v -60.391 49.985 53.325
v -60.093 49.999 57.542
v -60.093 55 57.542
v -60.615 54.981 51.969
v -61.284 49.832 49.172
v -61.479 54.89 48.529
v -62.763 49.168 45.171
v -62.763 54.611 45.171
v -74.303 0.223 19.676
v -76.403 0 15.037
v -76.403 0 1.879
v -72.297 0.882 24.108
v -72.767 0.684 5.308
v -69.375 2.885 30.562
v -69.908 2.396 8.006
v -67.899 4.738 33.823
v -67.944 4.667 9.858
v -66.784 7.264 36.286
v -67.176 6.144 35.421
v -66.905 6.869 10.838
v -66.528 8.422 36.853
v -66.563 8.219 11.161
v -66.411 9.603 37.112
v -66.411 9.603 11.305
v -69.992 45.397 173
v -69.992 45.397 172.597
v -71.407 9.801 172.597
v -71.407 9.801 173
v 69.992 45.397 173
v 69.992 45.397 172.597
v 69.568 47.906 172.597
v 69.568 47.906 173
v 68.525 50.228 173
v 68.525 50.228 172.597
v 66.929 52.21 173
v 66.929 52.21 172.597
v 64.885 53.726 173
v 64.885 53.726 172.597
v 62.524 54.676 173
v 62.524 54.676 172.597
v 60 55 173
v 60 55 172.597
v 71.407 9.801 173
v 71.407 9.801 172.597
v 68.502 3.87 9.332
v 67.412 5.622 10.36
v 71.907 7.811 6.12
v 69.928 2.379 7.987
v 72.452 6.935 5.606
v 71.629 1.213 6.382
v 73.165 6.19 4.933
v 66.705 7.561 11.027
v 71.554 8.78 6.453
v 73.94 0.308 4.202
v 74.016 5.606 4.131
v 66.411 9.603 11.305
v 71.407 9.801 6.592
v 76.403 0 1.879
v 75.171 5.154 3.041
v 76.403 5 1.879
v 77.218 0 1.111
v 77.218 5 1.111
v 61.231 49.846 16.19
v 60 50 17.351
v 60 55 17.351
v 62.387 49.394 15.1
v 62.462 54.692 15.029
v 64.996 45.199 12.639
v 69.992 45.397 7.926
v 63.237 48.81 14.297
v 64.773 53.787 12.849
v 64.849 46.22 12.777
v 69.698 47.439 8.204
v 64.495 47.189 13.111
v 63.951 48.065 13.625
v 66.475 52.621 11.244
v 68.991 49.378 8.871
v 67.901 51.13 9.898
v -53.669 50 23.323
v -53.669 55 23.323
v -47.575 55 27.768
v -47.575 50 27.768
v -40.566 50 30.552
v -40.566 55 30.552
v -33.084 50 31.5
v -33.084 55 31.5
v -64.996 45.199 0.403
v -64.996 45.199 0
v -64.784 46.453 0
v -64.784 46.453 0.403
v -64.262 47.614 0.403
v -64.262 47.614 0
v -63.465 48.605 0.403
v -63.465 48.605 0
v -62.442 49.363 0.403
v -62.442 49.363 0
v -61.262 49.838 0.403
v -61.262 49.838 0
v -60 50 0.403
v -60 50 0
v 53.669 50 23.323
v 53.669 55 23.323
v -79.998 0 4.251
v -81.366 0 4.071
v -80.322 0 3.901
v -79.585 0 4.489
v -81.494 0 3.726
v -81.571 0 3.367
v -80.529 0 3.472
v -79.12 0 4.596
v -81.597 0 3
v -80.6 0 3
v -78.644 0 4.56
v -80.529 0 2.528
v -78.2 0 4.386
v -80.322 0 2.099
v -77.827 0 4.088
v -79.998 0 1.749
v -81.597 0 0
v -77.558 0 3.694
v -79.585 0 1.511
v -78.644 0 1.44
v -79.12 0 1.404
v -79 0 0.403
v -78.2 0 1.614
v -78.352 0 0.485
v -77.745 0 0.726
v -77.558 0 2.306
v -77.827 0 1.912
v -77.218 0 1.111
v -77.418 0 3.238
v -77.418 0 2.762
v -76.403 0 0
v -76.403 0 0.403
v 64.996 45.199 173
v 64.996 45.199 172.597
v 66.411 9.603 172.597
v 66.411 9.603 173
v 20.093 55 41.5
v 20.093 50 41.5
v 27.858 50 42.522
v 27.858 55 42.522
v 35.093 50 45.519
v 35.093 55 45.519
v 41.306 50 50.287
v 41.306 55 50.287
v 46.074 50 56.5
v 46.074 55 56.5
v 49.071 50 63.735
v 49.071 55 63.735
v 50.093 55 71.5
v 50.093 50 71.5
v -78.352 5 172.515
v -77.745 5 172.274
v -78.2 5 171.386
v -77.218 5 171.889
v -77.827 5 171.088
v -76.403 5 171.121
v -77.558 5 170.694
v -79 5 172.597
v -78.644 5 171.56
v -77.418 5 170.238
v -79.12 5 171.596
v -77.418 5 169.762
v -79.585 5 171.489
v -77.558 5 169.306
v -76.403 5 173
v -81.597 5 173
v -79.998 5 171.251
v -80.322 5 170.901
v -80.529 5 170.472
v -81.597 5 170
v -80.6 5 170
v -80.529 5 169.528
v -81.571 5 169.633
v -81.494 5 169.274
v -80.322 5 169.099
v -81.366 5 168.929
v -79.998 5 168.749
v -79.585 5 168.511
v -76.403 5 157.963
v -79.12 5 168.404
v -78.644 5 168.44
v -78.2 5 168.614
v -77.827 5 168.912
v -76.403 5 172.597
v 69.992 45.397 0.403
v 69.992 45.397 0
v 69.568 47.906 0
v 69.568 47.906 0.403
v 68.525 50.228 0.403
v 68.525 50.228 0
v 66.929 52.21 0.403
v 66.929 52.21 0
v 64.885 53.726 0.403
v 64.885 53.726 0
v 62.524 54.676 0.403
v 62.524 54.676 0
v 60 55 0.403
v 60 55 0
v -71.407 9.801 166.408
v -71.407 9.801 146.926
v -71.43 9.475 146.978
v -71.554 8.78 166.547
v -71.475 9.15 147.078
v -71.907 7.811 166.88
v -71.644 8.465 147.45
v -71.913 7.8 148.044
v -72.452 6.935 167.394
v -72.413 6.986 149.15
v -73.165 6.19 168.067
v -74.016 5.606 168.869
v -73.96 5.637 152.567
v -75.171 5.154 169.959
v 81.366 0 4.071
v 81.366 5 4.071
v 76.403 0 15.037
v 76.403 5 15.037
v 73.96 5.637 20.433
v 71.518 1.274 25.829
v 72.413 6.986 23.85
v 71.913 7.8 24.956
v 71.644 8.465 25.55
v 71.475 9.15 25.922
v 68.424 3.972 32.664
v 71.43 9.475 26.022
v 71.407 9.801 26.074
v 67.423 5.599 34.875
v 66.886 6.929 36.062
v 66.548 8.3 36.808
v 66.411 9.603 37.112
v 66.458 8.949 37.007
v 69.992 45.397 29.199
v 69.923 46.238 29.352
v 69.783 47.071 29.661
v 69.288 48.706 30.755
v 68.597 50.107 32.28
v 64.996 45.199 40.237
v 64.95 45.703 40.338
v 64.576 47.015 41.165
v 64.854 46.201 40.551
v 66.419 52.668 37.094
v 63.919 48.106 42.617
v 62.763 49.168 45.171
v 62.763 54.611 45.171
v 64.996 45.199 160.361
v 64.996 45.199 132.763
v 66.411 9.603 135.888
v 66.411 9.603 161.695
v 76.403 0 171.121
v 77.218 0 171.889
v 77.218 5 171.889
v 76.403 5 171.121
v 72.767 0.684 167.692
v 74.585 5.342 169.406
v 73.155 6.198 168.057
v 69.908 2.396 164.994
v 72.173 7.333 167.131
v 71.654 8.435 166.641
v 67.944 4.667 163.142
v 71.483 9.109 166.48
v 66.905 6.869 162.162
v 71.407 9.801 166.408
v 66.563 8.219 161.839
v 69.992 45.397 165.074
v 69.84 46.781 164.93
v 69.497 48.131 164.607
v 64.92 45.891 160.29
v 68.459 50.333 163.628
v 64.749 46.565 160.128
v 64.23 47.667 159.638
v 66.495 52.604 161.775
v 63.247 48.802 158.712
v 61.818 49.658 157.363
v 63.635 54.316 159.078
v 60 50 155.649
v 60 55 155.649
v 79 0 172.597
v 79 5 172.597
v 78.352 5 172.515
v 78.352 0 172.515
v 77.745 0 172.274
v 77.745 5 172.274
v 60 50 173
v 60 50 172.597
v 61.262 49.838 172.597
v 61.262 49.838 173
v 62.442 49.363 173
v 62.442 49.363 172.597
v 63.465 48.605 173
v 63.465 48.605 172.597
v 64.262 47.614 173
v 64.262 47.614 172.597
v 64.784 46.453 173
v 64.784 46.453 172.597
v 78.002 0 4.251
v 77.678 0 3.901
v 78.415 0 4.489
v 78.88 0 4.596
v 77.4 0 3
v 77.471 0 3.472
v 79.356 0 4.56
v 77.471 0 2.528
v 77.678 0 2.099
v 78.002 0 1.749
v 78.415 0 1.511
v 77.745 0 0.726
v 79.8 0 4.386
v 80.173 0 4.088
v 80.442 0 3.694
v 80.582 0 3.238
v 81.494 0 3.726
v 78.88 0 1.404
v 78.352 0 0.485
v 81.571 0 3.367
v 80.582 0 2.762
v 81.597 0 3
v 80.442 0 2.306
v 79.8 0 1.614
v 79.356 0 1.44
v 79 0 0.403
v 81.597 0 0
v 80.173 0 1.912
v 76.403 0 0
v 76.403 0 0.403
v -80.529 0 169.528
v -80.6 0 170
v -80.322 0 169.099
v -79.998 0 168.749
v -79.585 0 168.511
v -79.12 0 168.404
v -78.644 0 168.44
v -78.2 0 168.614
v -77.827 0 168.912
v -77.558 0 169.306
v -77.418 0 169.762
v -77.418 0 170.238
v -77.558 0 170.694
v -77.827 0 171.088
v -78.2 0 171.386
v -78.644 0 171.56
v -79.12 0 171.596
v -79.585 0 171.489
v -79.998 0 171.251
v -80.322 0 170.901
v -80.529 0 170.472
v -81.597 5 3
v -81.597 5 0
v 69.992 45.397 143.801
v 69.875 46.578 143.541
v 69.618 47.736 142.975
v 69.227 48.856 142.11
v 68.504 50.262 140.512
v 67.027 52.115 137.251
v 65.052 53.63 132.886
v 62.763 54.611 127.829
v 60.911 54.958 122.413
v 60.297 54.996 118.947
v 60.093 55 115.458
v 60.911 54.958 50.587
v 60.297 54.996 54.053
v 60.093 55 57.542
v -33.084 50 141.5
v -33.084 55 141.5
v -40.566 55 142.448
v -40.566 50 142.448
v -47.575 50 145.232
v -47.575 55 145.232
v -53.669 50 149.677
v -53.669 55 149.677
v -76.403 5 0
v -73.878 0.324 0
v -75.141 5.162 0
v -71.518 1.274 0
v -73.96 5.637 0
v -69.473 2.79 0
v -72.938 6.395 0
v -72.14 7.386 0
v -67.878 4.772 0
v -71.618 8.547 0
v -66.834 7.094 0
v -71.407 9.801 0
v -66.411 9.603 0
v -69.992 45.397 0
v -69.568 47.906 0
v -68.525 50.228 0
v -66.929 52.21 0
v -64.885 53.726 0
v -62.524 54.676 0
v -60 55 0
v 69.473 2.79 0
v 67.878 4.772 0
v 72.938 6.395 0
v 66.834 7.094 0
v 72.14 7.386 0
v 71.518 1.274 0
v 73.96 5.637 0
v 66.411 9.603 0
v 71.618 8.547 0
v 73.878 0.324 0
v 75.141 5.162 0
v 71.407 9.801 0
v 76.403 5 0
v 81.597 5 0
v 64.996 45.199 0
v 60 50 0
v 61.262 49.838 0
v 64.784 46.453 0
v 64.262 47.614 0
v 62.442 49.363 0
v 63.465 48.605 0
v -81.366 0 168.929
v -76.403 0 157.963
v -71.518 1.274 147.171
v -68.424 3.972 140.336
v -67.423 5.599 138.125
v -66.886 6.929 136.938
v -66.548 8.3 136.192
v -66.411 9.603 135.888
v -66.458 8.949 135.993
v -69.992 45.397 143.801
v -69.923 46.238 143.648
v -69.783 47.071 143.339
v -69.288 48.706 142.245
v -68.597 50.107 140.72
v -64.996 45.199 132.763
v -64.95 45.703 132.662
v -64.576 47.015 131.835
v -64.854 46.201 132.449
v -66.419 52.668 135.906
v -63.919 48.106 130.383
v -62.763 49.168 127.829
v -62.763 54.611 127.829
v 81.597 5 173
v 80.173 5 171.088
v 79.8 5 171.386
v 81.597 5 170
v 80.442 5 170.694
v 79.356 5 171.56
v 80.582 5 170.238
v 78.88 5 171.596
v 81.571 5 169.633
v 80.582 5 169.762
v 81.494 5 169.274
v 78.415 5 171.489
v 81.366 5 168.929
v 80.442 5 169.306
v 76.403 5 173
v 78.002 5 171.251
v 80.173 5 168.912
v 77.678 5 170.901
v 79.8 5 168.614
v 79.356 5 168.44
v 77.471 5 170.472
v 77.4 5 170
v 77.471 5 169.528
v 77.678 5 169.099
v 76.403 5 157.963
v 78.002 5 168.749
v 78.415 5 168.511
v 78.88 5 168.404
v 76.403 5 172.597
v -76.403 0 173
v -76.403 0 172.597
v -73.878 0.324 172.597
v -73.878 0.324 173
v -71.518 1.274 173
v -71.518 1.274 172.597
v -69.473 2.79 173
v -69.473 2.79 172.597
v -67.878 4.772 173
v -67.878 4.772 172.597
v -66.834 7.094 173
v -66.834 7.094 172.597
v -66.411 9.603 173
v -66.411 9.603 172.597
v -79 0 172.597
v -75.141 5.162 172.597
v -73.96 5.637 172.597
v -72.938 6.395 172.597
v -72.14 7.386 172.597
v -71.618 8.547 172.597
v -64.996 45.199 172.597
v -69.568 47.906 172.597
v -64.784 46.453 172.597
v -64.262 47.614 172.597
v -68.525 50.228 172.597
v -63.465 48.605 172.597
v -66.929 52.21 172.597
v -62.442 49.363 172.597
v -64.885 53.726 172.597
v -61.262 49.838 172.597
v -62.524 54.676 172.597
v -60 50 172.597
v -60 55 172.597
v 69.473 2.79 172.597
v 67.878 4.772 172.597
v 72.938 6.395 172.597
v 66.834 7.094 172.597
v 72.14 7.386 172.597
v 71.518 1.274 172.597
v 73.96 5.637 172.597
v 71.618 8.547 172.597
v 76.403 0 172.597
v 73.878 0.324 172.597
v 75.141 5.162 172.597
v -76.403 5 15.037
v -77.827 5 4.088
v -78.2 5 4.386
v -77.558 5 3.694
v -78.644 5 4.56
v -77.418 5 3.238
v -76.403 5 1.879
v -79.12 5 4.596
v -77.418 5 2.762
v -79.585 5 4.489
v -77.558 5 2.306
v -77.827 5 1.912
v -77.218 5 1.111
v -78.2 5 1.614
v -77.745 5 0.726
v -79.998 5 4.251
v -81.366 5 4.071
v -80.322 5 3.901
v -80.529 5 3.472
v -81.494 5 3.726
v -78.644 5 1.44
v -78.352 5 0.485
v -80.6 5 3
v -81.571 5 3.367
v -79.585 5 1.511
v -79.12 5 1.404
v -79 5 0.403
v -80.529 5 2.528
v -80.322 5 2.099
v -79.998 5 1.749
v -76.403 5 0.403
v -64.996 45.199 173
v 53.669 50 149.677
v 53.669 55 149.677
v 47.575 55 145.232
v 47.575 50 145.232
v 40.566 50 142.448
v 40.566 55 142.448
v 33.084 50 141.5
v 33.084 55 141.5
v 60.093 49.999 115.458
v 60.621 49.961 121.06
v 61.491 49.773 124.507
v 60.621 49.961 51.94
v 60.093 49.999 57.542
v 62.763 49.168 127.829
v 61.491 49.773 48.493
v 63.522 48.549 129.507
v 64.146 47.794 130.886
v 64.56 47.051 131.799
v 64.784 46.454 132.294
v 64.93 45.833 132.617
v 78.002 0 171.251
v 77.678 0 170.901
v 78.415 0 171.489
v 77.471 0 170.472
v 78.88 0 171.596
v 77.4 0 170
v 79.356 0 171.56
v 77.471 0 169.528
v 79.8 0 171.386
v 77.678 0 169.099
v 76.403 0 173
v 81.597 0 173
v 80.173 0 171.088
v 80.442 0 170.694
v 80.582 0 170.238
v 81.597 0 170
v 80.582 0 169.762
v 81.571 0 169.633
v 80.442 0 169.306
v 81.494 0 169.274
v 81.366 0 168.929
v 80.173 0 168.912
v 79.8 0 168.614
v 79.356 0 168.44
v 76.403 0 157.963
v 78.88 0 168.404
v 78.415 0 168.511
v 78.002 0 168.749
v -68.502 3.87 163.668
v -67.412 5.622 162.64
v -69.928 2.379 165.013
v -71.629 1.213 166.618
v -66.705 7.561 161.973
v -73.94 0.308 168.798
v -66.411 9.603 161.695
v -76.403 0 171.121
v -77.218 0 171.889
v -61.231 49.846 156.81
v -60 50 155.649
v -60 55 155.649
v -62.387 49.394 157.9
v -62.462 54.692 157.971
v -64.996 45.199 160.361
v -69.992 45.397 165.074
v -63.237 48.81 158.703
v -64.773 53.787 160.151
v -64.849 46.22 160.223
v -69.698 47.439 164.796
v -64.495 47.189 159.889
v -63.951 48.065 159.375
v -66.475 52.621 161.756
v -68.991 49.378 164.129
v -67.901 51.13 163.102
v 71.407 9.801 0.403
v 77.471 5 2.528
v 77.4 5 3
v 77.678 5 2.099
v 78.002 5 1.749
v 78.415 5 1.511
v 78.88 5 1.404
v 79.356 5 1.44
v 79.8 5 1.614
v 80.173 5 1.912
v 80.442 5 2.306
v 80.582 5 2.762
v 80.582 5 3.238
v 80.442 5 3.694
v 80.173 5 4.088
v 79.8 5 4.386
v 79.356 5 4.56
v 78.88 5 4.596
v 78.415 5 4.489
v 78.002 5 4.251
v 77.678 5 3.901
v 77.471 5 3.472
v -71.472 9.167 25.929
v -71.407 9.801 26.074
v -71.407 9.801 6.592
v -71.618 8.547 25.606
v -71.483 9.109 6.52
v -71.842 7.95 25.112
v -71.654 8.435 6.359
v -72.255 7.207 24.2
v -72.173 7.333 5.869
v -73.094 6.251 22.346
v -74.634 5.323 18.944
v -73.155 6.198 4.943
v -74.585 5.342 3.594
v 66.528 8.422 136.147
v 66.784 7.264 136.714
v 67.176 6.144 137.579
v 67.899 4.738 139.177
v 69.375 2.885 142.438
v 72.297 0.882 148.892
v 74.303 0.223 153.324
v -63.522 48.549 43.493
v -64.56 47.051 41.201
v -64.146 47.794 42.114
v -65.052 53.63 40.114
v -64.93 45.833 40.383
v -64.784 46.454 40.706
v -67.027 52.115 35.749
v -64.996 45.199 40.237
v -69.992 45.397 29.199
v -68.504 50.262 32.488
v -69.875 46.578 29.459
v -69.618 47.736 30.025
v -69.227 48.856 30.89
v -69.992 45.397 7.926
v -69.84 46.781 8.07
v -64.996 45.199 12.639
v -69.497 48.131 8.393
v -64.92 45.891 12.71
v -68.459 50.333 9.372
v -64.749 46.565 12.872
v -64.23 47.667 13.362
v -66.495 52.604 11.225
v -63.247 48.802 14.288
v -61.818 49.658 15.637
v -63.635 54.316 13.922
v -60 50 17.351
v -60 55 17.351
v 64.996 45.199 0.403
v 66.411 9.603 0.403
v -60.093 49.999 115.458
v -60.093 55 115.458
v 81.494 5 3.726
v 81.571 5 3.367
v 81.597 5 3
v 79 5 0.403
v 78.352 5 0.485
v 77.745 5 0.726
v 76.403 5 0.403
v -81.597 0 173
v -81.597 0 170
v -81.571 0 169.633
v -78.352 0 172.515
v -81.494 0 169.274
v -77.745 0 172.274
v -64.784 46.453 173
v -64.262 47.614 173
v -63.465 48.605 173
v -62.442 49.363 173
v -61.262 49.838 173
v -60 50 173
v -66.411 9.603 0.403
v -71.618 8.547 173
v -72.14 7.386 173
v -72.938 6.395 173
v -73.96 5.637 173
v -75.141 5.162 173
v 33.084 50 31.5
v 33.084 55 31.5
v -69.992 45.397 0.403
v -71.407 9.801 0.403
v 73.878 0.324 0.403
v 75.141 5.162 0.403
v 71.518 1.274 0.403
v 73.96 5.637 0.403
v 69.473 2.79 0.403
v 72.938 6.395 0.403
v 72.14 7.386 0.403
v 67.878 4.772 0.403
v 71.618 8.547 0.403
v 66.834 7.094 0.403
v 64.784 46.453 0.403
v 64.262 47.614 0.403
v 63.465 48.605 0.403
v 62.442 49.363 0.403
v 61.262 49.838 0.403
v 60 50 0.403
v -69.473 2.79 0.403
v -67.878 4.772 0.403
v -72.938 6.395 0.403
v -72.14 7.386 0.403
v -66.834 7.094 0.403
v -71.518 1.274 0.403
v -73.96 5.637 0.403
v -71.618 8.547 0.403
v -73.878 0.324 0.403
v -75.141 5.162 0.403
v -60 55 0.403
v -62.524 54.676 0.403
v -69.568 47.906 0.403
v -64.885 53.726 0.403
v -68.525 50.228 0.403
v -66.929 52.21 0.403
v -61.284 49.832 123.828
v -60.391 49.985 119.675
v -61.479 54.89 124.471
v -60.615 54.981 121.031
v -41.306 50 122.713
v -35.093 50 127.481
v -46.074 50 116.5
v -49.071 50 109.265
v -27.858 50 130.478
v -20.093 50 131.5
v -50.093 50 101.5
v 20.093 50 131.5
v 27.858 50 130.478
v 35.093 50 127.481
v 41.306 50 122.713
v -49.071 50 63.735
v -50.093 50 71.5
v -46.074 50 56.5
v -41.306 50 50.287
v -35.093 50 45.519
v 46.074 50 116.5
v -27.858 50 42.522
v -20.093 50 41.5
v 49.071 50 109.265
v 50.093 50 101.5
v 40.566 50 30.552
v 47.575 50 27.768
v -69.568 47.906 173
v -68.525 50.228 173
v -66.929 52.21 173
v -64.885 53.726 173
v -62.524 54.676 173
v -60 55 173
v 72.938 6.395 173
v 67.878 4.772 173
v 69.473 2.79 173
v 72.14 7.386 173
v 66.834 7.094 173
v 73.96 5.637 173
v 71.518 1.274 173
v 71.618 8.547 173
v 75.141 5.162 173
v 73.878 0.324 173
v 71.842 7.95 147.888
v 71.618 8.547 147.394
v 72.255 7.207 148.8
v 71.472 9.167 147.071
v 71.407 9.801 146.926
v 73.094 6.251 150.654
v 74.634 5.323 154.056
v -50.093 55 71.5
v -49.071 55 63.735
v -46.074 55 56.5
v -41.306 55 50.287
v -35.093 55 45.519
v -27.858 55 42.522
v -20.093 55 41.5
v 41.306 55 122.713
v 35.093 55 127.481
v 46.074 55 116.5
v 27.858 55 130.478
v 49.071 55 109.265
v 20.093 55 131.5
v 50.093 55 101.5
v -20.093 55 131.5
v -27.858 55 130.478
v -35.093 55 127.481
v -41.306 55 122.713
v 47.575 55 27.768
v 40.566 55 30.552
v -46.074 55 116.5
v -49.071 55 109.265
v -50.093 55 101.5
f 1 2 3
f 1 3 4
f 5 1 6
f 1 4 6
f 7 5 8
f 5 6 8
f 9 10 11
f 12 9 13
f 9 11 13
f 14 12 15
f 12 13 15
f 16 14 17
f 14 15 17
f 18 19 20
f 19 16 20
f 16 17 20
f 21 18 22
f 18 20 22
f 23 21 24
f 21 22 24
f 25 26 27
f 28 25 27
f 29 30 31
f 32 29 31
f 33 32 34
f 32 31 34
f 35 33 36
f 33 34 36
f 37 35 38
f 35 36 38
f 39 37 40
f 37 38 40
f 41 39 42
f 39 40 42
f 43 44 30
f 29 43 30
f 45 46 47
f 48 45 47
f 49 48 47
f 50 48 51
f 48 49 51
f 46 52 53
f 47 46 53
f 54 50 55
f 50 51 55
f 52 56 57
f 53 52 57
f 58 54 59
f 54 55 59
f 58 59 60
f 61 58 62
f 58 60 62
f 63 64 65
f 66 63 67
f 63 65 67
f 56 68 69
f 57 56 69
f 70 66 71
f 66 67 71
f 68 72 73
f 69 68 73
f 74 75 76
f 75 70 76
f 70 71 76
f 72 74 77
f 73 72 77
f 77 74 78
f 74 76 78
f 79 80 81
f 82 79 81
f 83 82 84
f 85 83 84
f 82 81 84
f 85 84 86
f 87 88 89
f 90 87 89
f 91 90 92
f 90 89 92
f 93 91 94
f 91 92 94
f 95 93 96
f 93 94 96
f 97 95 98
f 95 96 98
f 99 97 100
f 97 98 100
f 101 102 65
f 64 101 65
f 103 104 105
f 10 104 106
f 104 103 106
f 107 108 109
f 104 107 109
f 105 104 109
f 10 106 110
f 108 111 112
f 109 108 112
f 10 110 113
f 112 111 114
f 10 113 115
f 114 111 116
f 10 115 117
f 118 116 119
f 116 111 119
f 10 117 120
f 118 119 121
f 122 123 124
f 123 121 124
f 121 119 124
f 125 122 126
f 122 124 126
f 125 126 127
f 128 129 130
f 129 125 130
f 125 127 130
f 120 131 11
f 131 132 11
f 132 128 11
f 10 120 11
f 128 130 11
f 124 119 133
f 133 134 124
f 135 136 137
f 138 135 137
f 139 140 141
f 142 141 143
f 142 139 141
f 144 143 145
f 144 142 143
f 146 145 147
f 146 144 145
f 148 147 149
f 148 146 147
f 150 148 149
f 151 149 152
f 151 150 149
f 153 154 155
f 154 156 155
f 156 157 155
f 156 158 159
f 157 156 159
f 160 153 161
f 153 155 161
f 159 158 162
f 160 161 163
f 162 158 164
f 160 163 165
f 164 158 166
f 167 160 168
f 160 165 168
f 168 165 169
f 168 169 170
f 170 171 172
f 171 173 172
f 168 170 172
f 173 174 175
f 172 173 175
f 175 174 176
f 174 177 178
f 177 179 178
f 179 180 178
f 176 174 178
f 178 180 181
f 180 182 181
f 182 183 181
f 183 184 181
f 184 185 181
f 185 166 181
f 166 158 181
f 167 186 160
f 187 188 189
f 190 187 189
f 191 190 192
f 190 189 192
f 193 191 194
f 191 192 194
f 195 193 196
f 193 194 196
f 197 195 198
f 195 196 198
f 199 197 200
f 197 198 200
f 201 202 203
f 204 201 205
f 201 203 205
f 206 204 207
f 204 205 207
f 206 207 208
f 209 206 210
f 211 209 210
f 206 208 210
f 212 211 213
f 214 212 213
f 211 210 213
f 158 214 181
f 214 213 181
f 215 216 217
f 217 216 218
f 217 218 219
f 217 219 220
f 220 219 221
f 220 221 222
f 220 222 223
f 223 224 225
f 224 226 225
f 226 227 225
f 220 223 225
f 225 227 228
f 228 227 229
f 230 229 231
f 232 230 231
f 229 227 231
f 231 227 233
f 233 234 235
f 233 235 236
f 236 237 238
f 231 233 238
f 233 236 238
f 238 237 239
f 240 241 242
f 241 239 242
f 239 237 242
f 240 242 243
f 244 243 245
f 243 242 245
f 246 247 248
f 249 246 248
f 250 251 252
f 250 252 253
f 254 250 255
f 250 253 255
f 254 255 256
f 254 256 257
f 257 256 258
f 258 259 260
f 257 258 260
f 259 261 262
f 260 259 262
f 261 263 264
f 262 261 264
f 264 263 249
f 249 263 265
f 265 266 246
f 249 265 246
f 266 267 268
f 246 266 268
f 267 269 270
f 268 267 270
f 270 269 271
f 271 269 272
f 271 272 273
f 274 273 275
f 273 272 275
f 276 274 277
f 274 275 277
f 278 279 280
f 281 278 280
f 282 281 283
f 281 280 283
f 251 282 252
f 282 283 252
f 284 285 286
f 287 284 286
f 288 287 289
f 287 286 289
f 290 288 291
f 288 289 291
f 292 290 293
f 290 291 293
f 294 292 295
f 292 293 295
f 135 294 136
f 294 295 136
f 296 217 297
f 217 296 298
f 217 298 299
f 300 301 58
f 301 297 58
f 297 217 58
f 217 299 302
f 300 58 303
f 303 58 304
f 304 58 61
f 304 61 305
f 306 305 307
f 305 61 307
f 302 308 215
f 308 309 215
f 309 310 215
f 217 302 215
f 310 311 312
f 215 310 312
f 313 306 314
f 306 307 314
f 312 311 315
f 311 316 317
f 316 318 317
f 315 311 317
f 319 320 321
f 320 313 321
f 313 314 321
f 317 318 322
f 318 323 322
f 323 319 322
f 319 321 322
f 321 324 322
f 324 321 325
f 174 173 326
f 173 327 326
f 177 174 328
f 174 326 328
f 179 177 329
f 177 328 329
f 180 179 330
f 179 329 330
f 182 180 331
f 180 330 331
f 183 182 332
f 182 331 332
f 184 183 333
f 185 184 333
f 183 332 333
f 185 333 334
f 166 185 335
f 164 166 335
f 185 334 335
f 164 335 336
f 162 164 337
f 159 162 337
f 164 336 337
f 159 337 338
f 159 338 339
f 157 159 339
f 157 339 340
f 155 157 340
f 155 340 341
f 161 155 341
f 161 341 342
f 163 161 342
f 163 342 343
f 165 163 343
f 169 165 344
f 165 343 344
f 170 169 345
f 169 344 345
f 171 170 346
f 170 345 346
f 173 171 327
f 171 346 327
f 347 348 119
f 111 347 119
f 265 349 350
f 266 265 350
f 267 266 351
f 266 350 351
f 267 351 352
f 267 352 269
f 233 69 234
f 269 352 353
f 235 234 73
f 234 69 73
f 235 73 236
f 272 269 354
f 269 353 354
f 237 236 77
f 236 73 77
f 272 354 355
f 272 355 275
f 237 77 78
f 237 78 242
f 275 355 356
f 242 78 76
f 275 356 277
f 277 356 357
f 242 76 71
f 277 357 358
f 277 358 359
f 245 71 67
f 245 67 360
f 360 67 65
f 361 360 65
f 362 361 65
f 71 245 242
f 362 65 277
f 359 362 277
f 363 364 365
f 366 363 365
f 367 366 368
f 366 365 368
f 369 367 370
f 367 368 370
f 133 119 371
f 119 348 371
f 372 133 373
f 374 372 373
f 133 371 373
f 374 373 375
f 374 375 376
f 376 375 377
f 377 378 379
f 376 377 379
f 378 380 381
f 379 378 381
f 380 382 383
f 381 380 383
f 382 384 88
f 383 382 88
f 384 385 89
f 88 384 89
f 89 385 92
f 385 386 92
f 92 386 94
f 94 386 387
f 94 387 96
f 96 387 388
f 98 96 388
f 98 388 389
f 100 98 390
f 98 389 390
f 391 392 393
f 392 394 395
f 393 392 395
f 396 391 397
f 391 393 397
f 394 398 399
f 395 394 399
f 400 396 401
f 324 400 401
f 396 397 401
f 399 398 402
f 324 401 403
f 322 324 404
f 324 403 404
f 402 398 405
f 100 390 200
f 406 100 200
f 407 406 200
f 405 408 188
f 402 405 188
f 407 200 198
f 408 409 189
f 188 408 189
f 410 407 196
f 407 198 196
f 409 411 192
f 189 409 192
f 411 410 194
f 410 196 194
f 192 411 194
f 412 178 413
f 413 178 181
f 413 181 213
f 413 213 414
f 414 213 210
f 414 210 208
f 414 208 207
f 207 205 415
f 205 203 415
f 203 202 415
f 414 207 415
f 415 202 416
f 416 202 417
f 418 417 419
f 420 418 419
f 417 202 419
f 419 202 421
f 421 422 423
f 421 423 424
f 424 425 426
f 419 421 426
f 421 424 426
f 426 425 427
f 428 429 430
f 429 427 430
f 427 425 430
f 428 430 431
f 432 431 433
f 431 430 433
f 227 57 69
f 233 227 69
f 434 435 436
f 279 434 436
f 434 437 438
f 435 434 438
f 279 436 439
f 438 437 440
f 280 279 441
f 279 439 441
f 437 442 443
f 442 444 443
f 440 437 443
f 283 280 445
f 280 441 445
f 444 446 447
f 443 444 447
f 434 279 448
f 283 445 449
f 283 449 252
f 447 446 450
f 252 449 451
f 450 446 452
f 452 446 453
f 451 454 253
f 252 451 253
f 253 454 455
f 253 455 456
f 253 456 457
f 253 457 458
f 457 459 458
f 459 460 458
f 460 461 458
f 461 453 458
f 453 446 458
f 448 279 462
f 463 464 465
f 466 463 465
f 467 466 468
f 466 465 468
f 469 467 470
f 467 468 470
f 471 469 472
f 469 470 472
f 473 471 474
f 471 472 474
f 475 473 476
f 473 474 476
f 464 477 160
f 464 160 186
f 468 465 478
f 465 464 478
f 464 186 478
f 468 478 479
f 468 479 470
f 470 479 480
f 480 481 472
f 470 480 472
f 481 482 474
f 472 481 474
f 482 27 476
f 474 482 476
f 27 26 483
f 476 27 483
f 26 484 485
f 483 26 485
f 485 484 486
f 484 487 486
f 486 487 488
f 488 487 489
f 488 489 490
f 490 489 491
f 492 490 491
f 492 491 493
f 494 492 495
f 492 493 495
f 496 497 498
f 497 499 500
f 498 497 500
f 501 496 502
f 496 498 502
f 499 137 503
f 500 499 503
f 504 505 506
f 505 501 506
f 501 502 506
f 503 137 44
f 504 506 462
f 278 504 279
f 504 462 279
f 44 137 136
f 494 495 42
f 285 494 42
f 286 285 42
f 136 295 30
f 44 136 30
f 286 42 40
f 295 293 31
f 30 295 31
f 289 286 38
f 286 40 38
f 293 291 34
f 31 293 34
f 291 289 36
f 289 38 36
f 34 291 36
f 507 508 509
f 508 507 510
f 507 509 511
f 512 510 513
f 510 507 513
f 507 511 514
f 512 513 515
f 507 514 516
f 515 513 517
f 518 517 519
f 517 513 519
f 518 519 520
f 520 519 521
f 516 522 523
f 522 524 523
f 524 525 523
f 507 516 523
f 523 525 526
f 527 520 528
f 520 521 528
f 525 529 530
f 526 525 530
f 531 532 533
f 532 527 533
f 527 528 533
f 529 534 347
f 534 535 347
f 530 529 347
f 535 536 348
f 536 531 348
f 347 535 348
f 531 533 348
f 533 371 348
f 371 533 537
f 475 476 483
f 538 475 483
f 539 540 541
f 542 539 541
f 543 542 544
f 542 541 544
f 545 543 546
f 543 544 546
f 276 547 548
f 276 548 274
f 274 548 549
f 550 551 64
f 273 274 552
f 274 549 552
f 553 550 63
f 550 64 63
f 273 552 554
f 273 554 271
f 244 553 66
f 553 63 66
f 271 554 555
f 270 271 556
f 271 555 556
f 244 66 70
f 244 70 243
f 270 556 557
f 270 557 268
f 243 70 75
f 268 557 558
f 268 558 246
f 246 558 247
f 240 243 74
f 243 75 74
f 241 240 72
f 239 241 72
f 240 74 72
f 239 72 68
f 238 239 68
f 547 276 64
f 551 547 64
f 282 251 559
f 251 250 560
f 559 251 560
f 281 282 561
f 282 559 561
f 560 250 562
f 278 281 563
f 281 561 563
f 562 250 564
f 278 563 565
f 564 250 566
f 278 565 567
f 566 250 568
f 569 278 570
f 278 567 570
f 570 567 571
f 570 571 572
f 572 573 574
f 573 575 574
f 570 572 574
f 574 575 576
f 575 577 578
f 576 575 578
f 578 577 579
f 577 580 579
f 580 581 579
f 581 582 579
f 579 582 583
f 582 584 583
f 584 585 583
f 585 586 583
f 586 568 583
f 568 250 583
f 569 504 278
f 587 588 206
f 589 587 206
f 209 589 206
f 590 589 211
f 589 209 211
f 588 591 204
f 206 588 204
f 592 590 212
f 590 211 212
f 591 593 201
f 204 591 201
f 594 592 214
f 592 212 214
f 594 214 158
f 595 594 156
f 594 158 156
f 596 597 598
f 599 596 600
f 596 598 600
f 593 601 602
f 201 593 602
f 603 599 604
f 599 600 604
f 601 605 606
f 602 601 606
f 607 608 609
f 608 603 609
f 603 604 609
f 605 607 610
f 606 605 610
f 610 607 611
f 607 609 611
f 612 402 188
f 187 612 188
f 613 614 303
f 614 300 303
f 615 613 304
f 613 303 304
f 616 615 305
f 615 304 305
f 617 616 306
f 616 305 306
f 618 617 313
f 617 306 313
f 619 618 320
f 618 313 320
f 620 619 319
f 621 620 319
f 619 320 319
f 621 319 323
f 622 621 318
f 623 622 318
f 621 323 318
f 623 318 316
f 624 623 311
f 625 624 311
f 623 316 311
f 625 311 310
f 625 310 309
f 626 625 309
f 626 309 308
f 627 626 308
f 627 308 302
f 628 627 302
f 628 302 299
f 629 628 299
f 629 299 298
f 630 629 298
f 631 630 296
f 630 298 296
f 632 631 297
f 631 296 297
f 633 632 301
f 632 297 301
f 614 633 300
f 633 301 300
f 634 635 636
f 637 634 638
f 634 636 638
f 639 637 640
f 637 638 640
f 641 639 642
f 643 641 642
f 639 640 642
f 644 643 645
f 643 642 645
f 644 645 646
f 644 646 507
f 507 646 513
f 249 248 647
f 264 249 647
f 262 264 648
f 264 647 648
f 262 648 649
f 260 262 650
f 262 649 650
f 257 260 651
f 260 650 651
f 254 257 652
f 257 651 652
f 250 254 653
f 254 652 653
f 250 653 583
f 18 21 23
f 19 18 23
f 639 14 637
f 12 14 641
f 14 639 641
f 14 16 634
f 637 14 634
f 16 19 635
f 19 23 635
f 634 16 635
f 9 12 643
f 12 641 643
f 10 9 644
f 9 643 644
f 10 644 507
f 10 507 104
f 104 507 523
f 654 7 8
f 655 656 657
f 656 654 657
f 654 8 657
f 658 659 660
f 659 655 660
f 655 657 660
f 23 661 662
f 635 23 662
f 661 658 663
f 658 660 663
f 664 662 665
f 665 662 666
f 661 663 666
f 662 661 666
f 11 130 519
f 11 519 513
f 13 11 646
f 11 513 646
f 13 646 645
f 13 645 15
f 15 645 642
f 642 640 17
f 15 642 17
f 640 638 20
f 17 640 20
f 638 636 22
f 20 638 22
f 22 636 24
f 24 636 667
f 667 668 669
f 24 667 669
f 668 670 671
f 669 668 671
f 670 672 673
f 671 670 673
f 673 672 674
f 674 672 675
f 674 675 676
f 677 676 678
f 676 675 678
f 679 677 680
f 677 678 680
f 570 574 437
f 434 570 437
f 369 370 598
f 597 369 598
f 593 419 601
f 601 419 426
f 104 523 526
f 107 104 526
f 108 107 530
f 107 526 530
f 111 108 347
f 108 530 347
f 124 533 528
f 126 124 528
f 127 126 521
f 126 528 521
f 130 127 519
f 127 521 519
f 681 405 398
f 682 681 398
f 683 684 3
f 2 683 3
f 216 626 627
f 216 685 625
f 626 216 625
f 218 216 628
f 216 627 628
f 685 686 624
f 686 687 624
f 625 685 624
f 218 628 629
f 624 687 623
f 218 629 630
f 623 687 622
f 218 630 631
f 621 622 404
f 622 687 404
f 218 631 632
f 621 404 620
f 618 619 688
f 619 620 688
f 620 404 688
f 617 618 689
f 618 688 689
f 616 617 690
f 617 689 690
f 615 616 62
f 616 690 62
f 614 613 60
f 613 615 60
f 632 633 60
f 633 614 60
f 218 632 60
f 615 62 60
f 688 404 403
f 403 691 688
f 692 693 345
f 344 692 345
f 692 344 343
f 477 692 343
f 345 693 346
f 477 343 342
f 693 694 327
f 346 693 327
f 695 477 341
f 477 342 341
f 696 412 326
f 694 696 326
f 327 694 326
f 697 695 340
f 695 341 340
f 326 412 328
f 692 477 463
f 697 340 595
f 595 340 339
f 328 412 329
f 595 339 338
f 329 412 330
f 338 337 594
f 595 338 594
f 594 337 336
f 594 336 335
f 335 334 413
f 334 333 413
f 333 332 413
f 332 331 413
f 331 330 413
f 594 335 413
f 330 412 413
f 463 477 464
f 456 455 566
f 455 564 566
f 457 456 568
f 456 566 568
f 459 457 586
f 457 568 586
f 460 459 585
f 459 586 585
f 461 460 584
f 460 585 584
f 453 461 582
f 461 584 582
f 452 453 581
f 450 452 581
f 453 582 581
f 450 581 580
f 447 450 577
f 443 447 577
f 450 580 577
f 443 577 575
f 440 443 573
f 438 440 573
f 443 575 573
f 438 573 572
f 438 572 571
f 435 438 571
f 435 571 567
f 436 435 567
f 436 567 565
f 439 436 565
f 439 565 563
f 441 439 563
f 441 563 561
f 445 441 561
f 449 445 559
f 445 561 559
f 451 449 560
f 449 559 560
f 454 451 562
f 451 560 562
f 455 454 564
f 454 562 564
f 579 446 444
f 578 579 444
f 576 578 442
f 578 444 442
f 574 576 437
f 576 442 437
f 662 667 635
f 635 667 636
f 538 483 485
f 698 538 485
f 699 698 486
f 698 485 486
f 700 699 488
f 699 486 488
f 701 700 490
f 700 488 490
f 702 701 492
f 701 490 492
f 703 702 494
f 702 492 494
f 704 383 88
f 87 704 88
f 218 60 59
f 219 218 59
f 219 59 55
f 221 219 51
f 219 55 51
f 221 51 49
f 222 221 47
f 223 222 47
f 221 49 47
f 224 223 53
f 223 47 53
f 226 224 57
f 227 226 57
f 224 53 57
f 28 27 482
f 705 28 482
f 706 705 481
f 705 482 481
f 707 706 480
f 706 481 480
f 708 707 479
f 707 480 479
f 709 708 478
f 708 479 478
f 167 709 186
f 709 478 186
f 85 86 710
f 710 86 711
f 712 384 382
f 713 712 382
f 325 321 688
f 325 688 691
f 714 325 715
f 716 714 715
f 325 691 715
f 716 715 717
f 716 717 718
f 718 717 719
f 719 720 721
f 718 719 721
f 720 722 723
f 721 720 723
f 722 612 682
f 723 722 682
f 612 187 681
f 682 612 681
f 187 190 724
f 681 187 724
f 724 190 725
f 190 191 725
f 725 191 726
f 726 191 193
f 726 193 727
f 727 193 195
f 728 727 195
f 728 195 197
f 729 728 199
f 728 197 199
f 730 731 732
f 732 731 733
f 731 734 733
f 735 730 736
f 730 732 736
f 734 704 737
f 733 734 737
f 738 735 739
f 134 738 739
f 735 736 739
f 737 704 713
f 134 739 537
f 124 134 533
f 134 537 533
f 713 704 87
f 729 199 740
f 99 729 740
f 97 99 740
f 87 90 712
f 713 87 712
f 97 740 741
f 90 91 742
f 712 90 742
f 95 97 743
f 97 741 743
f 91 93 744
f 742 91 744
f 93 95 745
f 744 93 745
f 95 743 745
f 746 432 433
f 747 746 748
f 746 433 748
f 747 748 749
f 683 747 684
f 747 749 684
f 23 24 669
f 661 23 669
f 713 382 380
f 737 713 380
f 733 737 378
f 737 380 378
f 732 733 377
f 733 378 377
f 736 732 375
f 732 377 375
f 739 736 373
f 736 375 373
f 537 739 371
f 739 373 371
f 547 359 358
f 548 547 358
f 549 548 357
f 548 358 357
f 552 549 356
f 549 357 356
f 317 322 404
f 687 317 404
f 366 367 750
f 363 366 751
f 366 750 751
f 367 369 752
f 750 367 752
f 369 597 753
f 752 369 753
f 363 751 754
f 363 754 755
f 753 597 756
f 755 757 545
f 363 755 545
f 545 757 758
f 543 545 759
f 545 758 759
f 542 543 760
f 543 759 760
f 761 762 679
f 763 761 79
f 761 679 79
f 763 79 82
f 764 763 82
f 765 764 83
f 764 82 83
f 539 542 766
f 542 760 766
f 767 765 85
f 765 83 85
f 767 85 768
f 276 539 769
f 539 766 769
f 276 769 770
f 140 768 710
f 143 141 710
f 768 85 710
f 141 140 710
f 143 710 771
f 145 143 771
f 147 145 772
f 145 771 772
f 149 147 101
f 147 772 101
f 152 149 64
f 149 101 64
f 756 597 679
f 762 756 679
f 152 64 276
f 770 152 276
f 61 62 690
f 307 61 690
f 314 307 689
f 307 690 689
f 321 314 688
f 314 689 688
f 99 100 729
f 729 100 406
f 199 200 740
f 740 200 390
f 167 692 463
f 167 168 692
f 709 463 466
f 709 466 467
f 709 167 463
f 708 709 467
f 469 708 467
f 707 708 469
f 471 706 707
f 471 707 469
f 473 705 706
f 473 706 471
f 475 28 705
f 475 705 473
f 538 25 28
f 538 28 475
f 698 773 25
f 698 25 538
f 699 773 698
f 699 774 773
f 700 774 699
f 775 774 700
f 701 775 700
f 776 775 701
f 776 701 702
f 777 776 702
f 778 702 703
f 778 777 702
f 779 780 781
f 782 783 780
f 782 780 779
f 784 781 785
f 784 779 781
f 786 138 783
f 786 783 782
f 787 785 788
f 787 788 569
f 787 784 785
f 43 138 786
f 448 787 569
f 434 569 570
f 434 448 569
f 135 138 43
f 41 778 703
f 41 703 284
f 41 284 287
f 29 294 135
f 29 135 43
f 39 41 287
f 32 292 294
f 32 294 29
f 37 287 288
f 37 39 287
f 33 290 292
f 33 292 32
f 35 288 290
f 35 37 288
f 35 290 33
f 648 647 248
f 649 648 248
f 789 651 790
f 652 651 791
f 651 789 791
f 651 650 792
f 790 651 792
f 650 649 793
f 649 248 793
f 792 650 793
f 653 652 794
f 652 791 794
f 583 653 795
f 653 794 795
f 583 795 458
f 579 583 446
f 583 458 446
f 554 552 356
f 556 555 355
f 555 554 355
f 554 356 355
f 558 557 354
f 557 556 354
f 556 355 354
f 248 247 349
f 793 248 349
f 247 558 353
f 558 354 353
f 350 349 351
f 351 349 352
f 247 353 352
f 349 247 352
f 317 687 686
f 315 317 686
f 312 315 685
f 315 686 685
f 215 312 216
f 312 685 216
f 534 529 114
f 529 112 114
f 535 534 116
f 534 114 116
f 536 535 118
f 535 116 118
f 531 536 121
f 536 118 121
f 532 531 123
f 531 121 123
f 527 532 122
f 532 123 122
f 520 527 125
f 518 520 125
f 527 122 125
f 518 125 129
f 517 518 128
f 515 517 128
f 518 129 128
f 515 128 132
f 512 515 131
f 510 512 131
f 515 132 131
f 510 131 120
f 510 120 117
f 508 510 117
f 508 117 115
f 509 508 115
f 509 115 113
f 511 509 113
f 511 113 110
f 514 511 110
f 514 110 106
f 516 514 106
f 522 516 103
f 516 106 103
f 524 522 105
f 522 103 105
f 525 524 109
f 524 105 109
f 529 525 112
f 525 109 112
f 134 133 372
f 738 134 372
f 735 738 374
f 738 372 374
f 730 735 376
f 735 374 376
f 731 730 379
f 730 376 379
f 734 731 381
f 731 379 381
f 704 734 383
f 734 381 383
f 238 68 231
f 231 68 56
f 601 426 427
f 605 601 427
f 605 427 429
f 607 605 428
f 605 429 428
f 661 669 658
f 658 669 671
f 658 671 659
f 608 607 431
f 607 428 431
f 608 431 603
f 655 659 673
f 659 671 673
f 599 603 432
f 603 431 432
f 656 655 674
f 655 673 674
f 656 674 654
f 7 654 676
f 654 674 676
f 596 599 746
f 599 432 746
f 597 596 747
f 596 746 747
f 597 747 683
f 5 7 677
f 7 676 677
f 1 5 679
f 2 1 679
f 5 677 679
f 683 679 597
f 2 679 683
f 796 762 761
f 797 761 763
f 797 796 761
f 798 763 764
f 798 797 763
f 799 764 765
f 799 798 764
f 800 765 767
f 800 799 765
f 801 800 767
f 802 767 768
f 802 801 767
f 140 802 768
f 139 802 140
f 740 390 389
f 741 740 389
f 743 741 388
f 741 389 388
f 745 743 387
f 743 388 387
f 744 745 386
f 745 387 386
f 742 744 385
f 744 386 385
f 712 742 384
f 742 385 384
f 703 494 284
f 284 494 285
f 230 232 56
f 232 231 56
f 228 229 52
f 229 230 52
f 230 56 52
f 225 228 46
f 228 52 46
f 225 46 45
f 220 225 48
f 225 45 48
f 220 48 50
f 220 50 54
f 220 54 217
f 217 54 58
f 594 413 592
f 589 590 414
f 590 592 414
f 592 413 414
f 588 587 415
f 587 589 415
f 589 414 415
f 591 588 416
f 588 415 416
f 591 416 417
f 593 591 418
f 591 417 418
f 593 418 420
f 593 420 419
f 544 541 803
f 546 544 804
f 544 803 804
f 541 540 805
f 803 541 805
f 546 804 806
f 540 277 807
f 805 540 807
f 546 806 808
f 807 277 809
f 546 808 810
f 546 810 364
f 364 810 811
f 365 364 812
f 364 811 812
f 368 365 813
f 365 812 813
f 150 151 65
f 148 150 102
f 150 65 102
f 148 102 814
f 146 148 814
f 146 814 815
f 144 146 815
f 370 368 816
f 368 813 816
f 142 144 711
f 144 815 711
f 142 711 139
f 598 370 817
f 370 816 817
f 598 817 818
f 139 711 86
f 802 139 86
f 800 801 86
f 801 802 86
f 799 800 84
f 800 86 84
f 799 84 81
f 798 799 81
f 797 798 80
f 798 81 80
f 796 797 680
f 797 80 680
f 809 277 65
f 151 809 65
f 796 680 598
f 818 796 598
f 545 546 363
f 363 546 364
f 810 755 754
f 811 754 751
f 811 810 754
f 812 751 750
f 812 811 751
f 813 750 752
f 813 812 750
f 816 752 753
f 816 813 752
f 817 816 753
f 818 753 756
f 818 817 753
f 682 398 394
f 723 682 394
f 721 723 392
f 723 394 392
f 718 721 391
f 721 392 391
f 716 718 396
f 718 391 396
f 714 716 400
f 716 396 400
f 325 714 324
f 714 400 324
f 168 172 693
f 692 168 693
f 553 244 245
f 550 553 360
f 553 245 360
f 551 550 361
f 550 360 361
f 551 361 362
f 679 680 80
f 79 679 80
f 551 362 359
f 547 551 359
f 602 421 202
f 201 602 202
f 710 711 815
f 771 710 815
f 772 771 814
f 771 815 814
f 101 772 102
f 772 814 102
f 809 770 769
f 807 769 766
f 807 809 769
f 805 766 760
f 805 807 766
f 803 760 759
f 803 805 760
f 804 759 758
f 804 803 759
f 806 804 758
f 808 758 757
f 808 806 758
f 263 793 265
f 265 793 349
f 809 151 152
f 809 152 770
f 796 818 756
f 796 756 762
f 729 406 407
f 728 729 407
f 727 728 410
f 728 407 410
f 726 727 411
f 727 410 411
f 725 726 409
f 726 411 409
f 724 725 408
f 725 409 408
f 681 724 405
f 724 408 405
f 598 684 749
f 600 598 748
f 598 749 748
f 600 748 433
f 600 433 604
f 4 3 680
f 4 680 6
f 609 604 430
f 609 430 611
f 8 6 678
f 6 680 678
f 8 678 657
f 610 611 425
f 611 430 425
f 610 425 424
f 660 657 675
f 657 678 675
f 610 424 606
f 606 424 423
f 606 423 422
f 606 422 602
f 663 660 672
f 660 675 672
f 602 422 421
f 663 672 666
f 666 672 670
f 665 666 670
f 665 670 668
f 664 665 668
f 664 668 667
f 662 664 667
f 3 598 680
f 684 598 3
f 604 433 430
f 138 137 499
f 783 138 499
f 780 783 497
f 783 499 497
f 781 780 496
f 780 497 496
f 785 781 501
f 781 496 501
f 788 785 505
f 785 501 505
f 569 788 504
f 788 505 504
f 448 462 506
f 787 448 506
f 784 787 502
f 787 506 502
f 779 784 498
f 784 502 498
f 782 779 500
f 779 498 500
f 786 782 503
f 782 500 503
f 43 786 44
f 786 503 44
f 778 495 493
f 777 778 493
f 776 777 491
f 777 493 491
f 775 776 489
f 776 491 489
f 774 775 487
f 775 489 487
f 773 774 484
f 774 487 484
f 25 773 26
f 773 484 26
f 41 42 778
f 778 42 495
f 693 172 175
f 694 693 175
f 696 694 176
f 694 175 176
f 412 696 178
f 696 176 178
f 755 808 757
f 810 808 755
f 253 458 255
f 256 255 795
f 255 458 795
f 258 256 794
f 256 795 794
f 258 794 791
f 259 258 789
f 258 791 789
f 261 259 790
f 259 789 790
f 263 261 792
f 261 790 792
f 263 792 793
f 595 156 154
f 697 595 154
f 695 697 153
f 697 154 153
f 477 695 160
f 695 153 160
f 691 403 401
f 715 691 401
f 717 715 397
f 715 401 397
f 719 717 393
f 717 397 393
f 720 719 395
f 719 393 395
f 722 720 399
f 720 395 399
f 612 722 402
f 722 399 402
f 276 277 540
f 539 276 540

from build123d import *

# Parameters (mm, degrees)
BOSS_EXTRU_1_DEPTH      = 173
D_GAGEMENT_M31_D        = 3.2
D_GAGEMENT_M31_DEPTH    = 5
D_GAGEMENT_M31_TIP      = 0.96137699
ENL_V_MAT_EXTRU_1_DEPTH = 56


with BuildPart() as part:
    # Esquisse1 → Boss.-Extru.1 (new body)
    with BuildSketch(Plane.XY):
        with BuildLine():
            Line((-81.597369332, 0), (-76.402630668, 0))
            ThreePointArc((-76.402630668, 0), (-69.473365186, 2.789918178), (-66.41051645, 9.602944025))
            Line((-66.41051645, 9.602944025), (-64.996057109, 45.198527987))
            ThreePointArc((-64.996057109, 45.198527987), (-63.464632741, 48.605040911), (-60, 50))
            Line((-60, 50), (60, 50))
            ThreePointArc((60, 50), (63.464632741, 48.605040911), (64.996057109, 45.198527987))
            Line((64.996057109, 45.198527987), (66.41051645, 9.602944025))
            ThreePointArc((66.41051645, 9.602944025), (69.473365186, 2.789918178), (76.402630668, 0))
            Line((76.402630668, 0), (81.597369332, 0))
            Line((81.597369332, 0), (81.597369332, 5))
            Line((81.597369332, 5), (76.402630668, 5))
            ThreePointArc((76.402630668, 5), (72.937997927, 6.394959089), (71.406573559, 9.801472013))
            Line((71.406573559, 9.801472013), (69.992114218, 45.397055975))
            ThreePointArc((69.992114218, 45.397055975), (66.929265482, 52.210081822), (60, 55))
            Line((60, 55), (-60, 55))
            ThreePointArc((-60, 55), (-66.929265482, 52.210081822), (-69.992114218, 45.397055975))
            Line((-69.992114218, 45.397055975), (-71.406573559, 9.801472013))
            ThreePointArc((-71.406573559, 9.801472013), (-72.937997927, 6.394959089), (-76.402630668, 5))
            Line((-76.402630668, 5), (-81.597369332, 5))
            Line((-81.597369332, 5), (-81.597369332, 0))
        make_face()
    extrude(amount=BOSS_EXTRU_1_DEPTH)

    # Dégagement M31
    with Locations(Plane(origin=(0, 5, 0), x_dir=(1, 0, 0), z_dir=(0, 1, 0))):
        with Locations((-79, -170), (-79, -3), (79, -170), (79, -3)):
            Hole(D_GAGEMENT_M31_D / 2, depth=D_GAGEMENT_M31_DEPTH)
            with Locations((0, 0, -(D_GAGEMENT_M31_DEPTH + D_GAGEMENT_M31_TIP / 2))):  # 118° drill point
                Cone(0, D_GAGEMENT_M31_D / 2, D_GAGEMENT_M31_TIP, mode=Mode.SUBTRACT)

    # Esquisse4 → Enlèv. mat.-Extru.1 (cut, through all)
    with BuildSketch(Plane(origin=(0, 55, 0), x_dir=(1, 0, 0), z_dir=(0, 1, 0))):
        with BuildLine():
            ThreePointArc((-20.093103017, -131.5), (-41.306306452, -122.713203436), (-50.093103017, -101.5))
            Line((-50.093103017, -101.5), (-50.093103017, -71.5))
            ThreePointArc((-50.093103017, -71.5), (-41.306306452, -50.286796564), (-20.093103017, -41.5))
            Line((-20.093103017, -41.5), (20.093103017, -41.5))
            ThreePointArc((20.093103017, -41.5), (41.306306452, -50.286796564), (50.093103017, -71.5))
            Line((50.093103017, -71.5), (50.093103017, -101.5))
            ThreePointArc((50.093103017, -101.5), (41.306306452, -122.713203436), (20.093103017, -131.5))
            Line((20.093103017, -131.5), (-20.093103017, -131.5))
        make_face()
        with BuildLine():
            ThreePointArc((81.366251775, -168.928935118), (81.538932575, -169.4521416), (81.597369332, -170))
            Line((81.597369332, -170), (81.597369332, -3))
            ThreePointArc((81.597369332, -3), (81.538932575, -3.5478584), (81.366251775, -4.071064882))
            Line((81.366251775, -4.071064882), (62.762544981, -45.171333393))
            ThreePointArc((62.762544981, -45.171333393), (60.768056204, -51.214445653), (60.093103017, -57.542291215))
            Line((60.093103017, -57.542291215), (60.093103017, -115.457708785))
            ThreePointArc((60.093103017, -115.457708785), (60.768056204, -121.785554347), (62.762544981, -127.828666607))
            Line((62.762544981, -127.828666607), (81.366251775, -168.928935118))
        make_face()
        with BuildLine():
            Line((60, -0.402630668), (-60, -0.402630668))
            Line((-60, -0.402630668), (-60, -17.351236736))
            Line((-60, -17.351236736), (-53.668539182, -23.323392752))
            ThreePointArc((-53.668539182, -23.323392752), (-44.158310479, -29.381013096), (-33.083604671, -31.5))
            Line((-33.083604671, -31.5), (33.083604671, -31.5))
            ThreePointArc((33.083604671, -31.5), (44.158310479, -29.381013096), (53.668539182, -23.323392752))
            Line((53.668539182, -23.323392752), (60, -17.351236736))
            Line((60, -17.351236736), (60, -0.402630668))
        make_face()
        with BuildLine():
            Line((-60, -0.402630668), (-79, -0.402630668))
            ThreePointArc((-79, -0.402630668), (-78.041163293, -0.586090388), (-77.217777414, -1.110552965))
            Line((-77.217777414, -1.110552965), (-60, -17.351236736))
            Line((-60, -17.351236736), (-60, -0.402630668))
        make_face()
        with BuildLine():
            Line((79, -0.402630668), (60, -0.402630668))
            Line((60, -0.402630668), (60, -17.351236736))
            Line((60, -17.351236736), (77.217777414, -1.110552965))
            ThreePointArc((77.217777414, -1.110552965), (78.041163293, -0.586090388), (79, -0.402630668))
        make_face()
        with BuildLine():
            ThreePointArc((-81.597369332, -170), (-81.538932575, -169.4521416), (-81.366251775, -168.928935118))
            Line((-81.366251775, -168.928935118), (-62.762544981, -127.828666607))
            ThreePointArc((-62.762544981, -127.828666607), (-60.768056204, -121.785554347), (-60.093103017, -115.457708785))
            Line((-60.093103017, -115.457708785), (-60.093103017, -57.542291215))
            ThreePointArc((-60.093103017, -57.542291215), (-60.768056204, -51.214445653), (-62.762544981, -45.171333393))
            Line((-62.762544981, -45.171333393), (-81.366251775, -4.071064882))
            ThreePointArc((-81.366251775, -4.071064882), (-81.538932575, -3.5478584), (-81.597369332, -3))
            Line((-81.597369332, -3), (-81.597369332, -170))
        make_face()
        with BuildLine():
            Line((-60, -155.648763264), (-60, -172.597369332))
            Line((-60, -172.597369332), (60, -172.597369332))
            Line((60, -172.597369332), (60, -155.648763264))
            Line((60, -155.648763264), (53.668539182, -149.676607248))
            ThreePointArc((53.668539182, -149.676607248), (44.158310479, -143.618986904), (33.083604671, -141.5))
            Line((33.083604671, -141.5), (-33.083604671, -141.5))
            ThreePointArc((-33.083604671, -141.5), (-44.158310479, -143.618986904), (-53.668539182, -149.676607248))
            Line((-53.668539182, -149.676607248), (-60, -155.648763264))
        make_face()
        with BuildLine():
            Line((60, -155.648763264), (60, -172.597369332))
            Line((60, -172.597369332), (79, -172.597369332))
            ThreePointArc((79, -172.597369332), (78.041163293, -172.413909612), (77.217777414, -171.889447035))
            Line((77.217777414, -171.889447035), (60, -155.648763264))
        make_face()
        with BuildLine():
            ThreePointArc((-77.217777414, -171.889447035), (-78.041163293, -172.413909612), (-79, -172.597369332))
            Line((-79, -172.597369332), (-60, -172.597369332))
            Line((-60, -172.597369332), (-60, -155.648763264))
            Line((-60, -155.648763264), (-77.217777414, -171.889447035))
        make_face()
    extrude(amount=-ENL_V_MAT_EXTRU_1_DEPTH, mode=Mode.SUBTRACT)


solid = part.part
